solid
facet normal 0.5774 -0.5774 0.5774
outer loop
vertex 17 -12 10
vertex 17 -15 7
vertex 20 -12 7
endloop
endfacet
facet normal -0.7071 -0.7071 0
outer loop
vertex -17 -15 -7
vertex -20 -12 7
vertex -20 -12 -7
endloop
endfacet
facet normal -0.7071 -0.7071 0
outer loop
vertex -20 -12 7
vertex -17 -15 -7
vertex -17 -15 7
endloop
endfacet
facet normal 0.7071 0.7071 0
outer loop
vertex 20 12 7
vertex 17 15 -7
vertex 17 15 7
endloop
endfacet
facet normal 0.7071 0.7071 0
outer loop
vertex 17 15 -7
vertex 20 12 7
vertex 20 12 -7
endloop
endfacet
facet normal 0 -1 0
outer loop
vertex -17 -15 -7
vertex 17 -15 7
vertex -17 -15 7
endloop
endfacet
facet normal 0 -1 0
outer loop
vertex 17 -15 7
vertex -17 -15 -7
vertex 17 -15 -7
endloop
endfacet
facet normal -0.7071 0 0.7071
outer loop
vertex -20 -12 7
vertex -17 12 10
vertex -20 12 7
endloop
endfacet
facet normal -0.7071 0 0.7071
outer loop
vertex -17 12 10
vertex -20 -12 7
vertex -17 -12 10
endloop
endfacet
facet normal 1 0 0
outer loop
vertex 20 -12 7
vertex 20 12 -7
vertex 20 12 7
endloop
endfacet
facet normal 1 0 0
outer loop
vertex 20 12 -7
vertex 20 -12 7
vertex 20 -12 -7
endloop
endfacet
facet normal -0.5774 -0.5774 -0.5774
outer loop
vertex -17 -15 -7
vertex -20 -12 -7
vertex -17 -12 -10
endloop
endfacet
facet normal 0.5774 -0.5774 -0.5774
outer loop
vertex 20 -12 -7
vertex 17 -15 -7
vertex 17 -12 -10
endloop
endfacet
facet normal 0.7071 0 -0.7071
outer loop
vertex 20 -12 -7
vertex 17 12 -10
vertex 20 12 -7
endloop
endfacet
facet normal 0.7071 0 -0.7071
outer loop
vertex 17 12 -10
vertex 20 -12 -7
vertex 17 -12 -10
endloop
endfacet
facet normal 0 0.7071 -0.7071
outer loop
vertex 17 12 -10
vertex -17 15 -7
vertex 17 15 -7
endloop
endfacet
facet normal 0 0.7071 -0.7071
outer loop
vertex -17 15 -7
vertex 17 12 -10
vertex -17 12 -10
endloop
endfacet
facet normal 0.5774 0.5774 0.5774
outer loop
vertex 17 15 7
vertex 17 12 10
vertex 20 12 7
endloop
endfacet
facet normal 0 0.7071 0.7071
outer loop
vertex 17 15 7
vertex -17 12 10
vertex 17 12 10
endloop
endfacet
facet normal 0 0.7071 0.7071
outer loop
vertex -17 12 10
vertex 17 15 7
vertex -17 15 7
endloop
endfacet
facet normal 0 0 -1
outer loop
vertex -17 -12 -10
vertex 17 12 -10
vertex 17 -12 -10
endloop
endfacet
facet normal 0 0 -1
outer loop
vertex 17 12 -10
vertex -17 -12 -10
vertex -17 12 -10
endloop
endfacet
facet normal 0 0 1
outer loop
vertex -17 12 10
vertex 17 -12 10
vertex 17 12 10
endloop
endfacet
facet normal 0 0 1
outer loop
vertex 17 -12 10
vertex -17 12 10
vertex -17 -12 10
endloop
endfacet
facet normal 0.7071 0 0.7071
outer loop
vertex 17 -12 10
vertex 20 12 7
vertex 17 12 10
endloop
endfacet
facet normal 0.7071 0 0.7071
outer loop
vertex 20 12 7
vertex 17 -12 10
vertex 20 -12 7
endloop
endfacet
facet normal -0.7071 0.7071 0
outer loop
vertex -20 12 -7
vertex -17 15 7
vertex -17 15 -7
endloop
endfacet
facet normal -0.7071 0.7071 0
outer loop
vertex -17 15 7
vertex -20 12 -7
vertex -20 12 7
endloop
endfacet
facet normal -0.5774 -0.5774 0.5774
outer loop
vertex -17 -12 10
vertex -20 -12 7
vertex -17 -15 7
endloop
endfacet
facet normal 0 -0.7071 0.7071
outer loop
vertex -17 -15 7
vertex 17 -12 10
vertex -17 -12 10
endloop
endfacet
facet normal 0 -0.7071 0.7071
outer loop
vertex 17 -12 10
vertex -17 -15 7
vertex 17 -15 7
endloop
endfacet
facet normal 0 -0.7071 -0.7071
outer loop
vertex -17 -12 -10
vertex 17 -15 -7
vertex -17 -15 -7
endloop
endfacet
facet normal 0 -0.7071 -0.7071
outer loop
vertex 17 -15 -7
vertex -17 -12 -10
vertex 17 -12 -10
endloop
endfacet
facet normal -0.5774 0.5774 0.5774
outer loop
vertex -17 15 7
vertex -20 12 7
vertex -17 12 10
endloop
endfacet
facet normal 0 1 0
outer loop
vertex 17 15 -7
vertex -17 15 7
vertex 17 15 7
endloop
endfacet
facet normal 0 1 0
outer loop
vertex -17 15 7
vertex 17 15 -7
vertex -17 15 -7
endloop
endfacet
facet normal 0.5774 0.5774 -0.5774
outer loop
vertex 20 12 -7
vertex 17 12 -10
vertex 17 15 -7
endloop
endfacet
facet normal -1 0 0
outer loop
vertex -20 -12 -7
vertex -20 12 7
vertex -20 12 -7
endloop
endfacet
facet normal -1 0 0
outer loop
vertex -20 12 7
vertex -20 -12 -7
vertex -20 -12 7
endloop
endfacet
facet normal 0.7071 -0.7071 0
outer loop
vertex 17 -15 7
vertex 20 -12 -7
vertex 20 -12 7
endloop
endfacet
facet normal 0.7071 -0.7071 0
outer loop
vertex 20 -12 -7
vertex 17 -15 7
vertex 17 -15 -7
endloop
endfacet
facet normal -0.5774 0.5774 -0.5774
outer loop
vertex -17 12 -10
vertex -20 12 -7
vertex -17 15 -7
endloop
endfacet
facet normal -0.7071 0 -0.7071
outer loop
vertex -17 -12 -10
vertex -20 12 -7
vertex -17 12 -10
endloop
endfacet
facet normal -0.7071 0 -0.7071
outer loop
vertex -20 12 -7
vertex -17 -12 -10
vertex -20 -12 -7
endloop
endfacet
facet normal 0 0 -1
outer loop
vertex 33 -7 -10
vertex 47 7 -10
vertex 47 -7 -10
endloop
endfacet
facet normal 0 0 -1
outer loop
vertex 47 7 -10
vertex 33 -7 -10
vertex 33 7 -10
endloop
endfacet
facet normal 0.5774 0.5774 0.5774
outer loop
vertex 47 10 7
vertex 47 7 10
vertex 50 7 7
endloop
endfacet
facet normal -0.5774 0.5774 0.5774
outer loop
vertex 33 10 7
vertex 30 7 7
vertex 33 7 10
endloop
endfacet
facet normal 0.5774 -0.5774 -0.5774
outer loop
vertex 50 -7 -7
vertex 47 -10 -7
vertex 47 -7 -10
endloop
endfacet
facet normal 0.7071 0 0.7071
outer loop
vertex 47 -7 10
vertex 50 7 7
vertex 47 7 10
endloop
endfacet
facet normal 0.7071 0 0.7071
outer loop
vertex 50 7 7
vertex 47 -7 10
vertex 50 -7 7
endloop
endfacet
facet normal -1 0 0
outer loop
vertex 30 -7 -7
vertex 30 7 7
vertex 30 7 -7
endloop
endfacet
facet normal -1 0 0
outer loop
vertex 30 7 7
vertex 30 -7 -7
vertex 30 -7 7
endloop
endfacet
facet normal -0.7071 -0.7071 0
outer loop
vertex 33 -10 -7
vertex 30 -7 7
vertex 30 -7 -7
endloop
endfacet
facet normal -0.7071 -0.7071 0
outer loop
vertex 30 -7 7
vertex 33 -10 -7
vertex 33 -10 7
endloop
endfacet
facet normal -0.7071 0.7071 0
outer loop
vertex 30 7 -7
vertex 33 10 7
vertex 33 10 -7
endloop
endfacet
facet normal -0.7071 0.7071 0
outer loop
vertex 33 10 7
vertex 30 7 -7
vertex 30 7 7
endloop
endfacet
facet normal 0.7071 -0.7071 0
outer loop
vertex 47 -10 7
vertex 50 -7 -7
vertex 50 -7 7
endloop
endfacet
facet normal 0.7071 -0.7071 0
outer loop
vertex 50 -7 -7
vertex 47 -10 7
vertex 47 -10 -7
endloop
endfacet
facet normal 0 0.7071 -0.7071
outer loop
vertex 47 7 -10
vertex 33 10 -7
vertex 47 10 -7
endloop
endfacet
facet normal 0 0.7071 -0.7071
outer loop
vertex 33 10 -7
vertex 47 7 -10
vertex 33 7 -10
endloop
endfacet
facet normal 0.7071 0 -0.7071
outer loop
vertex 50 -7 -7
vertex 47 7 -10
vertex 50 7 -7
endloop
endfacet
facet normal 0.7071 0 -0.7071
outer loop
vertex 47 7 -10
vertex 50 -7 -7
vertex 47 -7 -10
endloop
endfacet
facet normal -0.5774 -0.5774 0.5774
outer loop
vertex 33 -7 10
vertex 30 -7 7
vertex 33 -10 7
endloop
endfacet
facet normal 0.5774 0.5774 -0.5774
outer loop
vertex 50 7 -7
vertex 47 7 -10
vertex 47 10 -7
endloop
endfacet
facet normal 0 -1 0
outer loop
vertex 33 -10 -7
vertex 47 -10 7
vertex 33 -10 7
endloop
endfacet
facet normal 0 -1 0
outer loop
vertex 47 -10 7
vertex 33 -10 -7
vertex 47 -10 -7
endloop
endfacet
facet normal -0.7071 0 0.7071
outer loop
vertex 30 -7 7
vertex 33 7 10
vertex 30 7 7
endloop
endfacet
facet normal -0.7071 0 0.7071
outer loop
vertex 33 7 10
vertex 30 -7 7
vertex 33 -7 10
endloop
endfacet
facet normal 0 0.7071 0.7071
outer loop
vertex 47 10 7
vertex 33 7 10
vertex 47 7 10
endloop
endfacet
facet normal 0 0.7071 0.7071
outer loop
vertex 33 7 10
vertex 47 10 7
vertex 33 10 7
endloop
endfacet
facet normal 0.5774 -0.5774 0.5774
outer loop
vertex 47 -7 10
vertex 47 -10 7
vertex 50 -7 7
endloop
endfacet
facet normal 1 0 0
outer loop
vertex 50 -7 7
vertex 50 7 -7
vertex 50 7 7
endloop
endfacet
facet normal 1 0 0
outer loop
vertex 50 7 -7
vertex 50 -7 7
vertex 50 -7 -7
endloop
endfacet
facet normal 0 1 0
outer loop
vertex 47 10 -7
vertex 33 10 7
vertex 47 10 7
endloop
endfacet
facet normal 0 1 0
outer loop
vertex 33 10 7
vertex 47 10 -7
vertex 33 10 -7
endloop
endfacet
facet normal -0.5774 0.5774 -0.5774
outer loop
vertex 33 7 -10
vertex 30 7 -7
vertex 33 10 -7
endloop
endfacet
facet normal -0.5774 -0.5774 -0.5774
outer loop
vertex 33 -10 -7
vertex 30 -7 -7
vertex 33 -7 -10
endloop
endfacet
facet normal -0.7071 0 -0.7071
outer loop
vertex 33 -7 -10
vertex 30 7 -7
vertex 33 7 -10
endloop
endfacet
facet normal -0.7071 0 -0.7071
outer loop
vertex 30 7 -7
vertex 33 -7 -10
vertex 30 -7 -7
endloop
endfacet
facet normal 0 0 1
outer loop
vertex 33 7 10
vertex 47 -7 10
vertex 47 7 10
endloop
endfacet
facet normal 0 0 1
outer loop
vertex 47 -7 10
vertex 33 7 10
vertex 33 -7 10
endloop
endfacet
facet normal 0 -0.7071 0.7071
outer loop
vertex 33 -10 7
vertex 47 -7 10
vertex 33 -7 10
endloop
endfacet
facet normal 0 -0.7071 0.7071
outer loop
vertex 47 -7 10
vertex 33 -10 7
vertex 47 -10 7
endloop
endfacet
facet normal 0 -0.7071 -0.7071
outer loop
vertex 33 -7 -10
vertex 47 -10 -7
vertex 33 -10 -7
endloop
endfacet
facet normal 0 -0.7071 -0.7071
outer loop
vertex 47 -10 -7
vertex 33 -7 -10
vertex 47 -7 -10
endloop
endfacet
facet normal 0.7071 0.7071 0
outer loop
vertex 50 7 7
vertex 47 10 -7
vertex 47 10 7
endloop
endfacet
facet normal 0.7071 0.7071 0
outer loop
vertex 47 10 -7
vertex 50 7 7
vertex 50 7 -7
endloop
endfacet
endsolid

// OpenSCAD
/* * * * * * * * * * * * * * * * * * * * * * * * * * * * * * * * * * * * *\
 * Copyright (C) Claus Schrammel <claus@f05fk.net>                       *
 *                                                                       *
 * This program is free software: you can redistribute it and/or modify  *
 * it under the terms of the GNU General Public License as published by  *
 * the Free Software Foundation, either version 3 of the License, or     *
 * (at your option) any later version.                                   *
 *                                                                       *
 * This program is distributed in the hope that it will be useful,       *
 * but WITHOUT ANY WARRANTY; without even the implied warranty of        *
 * MERCHANTABILITY or FITNESS FOR A PARTICULAR PURPOSE.  See the         *
 * GNU General Public License for more details.                          *
 *                                                                       *
 * You should have received a copy of the GNU General Public License     *
 * along with this program.  If not, see <http://www.gnu.org/licenses/>. *
 *                                                                       *
 * SPDX-License-Identifier: GPL-3.0-or-later                             *
\* * * * * * * * * * * * * * * * * * * * * * * * * * * * * * * * * * * * */

CubeChamfered(size = [40, 30, 20], chamfer = 3, center = true);
translate([40, 0, 0])
CubeChamfered(size = 20, chamfer = 3, center = true);

module CubeChamfered(size, chamfer, center = false) {
    size = is_num(size) ? [size, size, size] : size;
    hull() {
        translate(center == true ? [0, 0, 0] : [size.x / 2, size.y / 2, size.z / 2]) {
           cube([size.x, size.y - 2 * chamfer, size.z - 2 * chamfer], center = true);
           cube([size.x - 2 * chamfer, size.y, size.z - 2 * chamfer], center = true);
           cube([size.x - 2 * chamfer, size.y - 2 * chamfer, size.z], center = true);
        }
    }
}
